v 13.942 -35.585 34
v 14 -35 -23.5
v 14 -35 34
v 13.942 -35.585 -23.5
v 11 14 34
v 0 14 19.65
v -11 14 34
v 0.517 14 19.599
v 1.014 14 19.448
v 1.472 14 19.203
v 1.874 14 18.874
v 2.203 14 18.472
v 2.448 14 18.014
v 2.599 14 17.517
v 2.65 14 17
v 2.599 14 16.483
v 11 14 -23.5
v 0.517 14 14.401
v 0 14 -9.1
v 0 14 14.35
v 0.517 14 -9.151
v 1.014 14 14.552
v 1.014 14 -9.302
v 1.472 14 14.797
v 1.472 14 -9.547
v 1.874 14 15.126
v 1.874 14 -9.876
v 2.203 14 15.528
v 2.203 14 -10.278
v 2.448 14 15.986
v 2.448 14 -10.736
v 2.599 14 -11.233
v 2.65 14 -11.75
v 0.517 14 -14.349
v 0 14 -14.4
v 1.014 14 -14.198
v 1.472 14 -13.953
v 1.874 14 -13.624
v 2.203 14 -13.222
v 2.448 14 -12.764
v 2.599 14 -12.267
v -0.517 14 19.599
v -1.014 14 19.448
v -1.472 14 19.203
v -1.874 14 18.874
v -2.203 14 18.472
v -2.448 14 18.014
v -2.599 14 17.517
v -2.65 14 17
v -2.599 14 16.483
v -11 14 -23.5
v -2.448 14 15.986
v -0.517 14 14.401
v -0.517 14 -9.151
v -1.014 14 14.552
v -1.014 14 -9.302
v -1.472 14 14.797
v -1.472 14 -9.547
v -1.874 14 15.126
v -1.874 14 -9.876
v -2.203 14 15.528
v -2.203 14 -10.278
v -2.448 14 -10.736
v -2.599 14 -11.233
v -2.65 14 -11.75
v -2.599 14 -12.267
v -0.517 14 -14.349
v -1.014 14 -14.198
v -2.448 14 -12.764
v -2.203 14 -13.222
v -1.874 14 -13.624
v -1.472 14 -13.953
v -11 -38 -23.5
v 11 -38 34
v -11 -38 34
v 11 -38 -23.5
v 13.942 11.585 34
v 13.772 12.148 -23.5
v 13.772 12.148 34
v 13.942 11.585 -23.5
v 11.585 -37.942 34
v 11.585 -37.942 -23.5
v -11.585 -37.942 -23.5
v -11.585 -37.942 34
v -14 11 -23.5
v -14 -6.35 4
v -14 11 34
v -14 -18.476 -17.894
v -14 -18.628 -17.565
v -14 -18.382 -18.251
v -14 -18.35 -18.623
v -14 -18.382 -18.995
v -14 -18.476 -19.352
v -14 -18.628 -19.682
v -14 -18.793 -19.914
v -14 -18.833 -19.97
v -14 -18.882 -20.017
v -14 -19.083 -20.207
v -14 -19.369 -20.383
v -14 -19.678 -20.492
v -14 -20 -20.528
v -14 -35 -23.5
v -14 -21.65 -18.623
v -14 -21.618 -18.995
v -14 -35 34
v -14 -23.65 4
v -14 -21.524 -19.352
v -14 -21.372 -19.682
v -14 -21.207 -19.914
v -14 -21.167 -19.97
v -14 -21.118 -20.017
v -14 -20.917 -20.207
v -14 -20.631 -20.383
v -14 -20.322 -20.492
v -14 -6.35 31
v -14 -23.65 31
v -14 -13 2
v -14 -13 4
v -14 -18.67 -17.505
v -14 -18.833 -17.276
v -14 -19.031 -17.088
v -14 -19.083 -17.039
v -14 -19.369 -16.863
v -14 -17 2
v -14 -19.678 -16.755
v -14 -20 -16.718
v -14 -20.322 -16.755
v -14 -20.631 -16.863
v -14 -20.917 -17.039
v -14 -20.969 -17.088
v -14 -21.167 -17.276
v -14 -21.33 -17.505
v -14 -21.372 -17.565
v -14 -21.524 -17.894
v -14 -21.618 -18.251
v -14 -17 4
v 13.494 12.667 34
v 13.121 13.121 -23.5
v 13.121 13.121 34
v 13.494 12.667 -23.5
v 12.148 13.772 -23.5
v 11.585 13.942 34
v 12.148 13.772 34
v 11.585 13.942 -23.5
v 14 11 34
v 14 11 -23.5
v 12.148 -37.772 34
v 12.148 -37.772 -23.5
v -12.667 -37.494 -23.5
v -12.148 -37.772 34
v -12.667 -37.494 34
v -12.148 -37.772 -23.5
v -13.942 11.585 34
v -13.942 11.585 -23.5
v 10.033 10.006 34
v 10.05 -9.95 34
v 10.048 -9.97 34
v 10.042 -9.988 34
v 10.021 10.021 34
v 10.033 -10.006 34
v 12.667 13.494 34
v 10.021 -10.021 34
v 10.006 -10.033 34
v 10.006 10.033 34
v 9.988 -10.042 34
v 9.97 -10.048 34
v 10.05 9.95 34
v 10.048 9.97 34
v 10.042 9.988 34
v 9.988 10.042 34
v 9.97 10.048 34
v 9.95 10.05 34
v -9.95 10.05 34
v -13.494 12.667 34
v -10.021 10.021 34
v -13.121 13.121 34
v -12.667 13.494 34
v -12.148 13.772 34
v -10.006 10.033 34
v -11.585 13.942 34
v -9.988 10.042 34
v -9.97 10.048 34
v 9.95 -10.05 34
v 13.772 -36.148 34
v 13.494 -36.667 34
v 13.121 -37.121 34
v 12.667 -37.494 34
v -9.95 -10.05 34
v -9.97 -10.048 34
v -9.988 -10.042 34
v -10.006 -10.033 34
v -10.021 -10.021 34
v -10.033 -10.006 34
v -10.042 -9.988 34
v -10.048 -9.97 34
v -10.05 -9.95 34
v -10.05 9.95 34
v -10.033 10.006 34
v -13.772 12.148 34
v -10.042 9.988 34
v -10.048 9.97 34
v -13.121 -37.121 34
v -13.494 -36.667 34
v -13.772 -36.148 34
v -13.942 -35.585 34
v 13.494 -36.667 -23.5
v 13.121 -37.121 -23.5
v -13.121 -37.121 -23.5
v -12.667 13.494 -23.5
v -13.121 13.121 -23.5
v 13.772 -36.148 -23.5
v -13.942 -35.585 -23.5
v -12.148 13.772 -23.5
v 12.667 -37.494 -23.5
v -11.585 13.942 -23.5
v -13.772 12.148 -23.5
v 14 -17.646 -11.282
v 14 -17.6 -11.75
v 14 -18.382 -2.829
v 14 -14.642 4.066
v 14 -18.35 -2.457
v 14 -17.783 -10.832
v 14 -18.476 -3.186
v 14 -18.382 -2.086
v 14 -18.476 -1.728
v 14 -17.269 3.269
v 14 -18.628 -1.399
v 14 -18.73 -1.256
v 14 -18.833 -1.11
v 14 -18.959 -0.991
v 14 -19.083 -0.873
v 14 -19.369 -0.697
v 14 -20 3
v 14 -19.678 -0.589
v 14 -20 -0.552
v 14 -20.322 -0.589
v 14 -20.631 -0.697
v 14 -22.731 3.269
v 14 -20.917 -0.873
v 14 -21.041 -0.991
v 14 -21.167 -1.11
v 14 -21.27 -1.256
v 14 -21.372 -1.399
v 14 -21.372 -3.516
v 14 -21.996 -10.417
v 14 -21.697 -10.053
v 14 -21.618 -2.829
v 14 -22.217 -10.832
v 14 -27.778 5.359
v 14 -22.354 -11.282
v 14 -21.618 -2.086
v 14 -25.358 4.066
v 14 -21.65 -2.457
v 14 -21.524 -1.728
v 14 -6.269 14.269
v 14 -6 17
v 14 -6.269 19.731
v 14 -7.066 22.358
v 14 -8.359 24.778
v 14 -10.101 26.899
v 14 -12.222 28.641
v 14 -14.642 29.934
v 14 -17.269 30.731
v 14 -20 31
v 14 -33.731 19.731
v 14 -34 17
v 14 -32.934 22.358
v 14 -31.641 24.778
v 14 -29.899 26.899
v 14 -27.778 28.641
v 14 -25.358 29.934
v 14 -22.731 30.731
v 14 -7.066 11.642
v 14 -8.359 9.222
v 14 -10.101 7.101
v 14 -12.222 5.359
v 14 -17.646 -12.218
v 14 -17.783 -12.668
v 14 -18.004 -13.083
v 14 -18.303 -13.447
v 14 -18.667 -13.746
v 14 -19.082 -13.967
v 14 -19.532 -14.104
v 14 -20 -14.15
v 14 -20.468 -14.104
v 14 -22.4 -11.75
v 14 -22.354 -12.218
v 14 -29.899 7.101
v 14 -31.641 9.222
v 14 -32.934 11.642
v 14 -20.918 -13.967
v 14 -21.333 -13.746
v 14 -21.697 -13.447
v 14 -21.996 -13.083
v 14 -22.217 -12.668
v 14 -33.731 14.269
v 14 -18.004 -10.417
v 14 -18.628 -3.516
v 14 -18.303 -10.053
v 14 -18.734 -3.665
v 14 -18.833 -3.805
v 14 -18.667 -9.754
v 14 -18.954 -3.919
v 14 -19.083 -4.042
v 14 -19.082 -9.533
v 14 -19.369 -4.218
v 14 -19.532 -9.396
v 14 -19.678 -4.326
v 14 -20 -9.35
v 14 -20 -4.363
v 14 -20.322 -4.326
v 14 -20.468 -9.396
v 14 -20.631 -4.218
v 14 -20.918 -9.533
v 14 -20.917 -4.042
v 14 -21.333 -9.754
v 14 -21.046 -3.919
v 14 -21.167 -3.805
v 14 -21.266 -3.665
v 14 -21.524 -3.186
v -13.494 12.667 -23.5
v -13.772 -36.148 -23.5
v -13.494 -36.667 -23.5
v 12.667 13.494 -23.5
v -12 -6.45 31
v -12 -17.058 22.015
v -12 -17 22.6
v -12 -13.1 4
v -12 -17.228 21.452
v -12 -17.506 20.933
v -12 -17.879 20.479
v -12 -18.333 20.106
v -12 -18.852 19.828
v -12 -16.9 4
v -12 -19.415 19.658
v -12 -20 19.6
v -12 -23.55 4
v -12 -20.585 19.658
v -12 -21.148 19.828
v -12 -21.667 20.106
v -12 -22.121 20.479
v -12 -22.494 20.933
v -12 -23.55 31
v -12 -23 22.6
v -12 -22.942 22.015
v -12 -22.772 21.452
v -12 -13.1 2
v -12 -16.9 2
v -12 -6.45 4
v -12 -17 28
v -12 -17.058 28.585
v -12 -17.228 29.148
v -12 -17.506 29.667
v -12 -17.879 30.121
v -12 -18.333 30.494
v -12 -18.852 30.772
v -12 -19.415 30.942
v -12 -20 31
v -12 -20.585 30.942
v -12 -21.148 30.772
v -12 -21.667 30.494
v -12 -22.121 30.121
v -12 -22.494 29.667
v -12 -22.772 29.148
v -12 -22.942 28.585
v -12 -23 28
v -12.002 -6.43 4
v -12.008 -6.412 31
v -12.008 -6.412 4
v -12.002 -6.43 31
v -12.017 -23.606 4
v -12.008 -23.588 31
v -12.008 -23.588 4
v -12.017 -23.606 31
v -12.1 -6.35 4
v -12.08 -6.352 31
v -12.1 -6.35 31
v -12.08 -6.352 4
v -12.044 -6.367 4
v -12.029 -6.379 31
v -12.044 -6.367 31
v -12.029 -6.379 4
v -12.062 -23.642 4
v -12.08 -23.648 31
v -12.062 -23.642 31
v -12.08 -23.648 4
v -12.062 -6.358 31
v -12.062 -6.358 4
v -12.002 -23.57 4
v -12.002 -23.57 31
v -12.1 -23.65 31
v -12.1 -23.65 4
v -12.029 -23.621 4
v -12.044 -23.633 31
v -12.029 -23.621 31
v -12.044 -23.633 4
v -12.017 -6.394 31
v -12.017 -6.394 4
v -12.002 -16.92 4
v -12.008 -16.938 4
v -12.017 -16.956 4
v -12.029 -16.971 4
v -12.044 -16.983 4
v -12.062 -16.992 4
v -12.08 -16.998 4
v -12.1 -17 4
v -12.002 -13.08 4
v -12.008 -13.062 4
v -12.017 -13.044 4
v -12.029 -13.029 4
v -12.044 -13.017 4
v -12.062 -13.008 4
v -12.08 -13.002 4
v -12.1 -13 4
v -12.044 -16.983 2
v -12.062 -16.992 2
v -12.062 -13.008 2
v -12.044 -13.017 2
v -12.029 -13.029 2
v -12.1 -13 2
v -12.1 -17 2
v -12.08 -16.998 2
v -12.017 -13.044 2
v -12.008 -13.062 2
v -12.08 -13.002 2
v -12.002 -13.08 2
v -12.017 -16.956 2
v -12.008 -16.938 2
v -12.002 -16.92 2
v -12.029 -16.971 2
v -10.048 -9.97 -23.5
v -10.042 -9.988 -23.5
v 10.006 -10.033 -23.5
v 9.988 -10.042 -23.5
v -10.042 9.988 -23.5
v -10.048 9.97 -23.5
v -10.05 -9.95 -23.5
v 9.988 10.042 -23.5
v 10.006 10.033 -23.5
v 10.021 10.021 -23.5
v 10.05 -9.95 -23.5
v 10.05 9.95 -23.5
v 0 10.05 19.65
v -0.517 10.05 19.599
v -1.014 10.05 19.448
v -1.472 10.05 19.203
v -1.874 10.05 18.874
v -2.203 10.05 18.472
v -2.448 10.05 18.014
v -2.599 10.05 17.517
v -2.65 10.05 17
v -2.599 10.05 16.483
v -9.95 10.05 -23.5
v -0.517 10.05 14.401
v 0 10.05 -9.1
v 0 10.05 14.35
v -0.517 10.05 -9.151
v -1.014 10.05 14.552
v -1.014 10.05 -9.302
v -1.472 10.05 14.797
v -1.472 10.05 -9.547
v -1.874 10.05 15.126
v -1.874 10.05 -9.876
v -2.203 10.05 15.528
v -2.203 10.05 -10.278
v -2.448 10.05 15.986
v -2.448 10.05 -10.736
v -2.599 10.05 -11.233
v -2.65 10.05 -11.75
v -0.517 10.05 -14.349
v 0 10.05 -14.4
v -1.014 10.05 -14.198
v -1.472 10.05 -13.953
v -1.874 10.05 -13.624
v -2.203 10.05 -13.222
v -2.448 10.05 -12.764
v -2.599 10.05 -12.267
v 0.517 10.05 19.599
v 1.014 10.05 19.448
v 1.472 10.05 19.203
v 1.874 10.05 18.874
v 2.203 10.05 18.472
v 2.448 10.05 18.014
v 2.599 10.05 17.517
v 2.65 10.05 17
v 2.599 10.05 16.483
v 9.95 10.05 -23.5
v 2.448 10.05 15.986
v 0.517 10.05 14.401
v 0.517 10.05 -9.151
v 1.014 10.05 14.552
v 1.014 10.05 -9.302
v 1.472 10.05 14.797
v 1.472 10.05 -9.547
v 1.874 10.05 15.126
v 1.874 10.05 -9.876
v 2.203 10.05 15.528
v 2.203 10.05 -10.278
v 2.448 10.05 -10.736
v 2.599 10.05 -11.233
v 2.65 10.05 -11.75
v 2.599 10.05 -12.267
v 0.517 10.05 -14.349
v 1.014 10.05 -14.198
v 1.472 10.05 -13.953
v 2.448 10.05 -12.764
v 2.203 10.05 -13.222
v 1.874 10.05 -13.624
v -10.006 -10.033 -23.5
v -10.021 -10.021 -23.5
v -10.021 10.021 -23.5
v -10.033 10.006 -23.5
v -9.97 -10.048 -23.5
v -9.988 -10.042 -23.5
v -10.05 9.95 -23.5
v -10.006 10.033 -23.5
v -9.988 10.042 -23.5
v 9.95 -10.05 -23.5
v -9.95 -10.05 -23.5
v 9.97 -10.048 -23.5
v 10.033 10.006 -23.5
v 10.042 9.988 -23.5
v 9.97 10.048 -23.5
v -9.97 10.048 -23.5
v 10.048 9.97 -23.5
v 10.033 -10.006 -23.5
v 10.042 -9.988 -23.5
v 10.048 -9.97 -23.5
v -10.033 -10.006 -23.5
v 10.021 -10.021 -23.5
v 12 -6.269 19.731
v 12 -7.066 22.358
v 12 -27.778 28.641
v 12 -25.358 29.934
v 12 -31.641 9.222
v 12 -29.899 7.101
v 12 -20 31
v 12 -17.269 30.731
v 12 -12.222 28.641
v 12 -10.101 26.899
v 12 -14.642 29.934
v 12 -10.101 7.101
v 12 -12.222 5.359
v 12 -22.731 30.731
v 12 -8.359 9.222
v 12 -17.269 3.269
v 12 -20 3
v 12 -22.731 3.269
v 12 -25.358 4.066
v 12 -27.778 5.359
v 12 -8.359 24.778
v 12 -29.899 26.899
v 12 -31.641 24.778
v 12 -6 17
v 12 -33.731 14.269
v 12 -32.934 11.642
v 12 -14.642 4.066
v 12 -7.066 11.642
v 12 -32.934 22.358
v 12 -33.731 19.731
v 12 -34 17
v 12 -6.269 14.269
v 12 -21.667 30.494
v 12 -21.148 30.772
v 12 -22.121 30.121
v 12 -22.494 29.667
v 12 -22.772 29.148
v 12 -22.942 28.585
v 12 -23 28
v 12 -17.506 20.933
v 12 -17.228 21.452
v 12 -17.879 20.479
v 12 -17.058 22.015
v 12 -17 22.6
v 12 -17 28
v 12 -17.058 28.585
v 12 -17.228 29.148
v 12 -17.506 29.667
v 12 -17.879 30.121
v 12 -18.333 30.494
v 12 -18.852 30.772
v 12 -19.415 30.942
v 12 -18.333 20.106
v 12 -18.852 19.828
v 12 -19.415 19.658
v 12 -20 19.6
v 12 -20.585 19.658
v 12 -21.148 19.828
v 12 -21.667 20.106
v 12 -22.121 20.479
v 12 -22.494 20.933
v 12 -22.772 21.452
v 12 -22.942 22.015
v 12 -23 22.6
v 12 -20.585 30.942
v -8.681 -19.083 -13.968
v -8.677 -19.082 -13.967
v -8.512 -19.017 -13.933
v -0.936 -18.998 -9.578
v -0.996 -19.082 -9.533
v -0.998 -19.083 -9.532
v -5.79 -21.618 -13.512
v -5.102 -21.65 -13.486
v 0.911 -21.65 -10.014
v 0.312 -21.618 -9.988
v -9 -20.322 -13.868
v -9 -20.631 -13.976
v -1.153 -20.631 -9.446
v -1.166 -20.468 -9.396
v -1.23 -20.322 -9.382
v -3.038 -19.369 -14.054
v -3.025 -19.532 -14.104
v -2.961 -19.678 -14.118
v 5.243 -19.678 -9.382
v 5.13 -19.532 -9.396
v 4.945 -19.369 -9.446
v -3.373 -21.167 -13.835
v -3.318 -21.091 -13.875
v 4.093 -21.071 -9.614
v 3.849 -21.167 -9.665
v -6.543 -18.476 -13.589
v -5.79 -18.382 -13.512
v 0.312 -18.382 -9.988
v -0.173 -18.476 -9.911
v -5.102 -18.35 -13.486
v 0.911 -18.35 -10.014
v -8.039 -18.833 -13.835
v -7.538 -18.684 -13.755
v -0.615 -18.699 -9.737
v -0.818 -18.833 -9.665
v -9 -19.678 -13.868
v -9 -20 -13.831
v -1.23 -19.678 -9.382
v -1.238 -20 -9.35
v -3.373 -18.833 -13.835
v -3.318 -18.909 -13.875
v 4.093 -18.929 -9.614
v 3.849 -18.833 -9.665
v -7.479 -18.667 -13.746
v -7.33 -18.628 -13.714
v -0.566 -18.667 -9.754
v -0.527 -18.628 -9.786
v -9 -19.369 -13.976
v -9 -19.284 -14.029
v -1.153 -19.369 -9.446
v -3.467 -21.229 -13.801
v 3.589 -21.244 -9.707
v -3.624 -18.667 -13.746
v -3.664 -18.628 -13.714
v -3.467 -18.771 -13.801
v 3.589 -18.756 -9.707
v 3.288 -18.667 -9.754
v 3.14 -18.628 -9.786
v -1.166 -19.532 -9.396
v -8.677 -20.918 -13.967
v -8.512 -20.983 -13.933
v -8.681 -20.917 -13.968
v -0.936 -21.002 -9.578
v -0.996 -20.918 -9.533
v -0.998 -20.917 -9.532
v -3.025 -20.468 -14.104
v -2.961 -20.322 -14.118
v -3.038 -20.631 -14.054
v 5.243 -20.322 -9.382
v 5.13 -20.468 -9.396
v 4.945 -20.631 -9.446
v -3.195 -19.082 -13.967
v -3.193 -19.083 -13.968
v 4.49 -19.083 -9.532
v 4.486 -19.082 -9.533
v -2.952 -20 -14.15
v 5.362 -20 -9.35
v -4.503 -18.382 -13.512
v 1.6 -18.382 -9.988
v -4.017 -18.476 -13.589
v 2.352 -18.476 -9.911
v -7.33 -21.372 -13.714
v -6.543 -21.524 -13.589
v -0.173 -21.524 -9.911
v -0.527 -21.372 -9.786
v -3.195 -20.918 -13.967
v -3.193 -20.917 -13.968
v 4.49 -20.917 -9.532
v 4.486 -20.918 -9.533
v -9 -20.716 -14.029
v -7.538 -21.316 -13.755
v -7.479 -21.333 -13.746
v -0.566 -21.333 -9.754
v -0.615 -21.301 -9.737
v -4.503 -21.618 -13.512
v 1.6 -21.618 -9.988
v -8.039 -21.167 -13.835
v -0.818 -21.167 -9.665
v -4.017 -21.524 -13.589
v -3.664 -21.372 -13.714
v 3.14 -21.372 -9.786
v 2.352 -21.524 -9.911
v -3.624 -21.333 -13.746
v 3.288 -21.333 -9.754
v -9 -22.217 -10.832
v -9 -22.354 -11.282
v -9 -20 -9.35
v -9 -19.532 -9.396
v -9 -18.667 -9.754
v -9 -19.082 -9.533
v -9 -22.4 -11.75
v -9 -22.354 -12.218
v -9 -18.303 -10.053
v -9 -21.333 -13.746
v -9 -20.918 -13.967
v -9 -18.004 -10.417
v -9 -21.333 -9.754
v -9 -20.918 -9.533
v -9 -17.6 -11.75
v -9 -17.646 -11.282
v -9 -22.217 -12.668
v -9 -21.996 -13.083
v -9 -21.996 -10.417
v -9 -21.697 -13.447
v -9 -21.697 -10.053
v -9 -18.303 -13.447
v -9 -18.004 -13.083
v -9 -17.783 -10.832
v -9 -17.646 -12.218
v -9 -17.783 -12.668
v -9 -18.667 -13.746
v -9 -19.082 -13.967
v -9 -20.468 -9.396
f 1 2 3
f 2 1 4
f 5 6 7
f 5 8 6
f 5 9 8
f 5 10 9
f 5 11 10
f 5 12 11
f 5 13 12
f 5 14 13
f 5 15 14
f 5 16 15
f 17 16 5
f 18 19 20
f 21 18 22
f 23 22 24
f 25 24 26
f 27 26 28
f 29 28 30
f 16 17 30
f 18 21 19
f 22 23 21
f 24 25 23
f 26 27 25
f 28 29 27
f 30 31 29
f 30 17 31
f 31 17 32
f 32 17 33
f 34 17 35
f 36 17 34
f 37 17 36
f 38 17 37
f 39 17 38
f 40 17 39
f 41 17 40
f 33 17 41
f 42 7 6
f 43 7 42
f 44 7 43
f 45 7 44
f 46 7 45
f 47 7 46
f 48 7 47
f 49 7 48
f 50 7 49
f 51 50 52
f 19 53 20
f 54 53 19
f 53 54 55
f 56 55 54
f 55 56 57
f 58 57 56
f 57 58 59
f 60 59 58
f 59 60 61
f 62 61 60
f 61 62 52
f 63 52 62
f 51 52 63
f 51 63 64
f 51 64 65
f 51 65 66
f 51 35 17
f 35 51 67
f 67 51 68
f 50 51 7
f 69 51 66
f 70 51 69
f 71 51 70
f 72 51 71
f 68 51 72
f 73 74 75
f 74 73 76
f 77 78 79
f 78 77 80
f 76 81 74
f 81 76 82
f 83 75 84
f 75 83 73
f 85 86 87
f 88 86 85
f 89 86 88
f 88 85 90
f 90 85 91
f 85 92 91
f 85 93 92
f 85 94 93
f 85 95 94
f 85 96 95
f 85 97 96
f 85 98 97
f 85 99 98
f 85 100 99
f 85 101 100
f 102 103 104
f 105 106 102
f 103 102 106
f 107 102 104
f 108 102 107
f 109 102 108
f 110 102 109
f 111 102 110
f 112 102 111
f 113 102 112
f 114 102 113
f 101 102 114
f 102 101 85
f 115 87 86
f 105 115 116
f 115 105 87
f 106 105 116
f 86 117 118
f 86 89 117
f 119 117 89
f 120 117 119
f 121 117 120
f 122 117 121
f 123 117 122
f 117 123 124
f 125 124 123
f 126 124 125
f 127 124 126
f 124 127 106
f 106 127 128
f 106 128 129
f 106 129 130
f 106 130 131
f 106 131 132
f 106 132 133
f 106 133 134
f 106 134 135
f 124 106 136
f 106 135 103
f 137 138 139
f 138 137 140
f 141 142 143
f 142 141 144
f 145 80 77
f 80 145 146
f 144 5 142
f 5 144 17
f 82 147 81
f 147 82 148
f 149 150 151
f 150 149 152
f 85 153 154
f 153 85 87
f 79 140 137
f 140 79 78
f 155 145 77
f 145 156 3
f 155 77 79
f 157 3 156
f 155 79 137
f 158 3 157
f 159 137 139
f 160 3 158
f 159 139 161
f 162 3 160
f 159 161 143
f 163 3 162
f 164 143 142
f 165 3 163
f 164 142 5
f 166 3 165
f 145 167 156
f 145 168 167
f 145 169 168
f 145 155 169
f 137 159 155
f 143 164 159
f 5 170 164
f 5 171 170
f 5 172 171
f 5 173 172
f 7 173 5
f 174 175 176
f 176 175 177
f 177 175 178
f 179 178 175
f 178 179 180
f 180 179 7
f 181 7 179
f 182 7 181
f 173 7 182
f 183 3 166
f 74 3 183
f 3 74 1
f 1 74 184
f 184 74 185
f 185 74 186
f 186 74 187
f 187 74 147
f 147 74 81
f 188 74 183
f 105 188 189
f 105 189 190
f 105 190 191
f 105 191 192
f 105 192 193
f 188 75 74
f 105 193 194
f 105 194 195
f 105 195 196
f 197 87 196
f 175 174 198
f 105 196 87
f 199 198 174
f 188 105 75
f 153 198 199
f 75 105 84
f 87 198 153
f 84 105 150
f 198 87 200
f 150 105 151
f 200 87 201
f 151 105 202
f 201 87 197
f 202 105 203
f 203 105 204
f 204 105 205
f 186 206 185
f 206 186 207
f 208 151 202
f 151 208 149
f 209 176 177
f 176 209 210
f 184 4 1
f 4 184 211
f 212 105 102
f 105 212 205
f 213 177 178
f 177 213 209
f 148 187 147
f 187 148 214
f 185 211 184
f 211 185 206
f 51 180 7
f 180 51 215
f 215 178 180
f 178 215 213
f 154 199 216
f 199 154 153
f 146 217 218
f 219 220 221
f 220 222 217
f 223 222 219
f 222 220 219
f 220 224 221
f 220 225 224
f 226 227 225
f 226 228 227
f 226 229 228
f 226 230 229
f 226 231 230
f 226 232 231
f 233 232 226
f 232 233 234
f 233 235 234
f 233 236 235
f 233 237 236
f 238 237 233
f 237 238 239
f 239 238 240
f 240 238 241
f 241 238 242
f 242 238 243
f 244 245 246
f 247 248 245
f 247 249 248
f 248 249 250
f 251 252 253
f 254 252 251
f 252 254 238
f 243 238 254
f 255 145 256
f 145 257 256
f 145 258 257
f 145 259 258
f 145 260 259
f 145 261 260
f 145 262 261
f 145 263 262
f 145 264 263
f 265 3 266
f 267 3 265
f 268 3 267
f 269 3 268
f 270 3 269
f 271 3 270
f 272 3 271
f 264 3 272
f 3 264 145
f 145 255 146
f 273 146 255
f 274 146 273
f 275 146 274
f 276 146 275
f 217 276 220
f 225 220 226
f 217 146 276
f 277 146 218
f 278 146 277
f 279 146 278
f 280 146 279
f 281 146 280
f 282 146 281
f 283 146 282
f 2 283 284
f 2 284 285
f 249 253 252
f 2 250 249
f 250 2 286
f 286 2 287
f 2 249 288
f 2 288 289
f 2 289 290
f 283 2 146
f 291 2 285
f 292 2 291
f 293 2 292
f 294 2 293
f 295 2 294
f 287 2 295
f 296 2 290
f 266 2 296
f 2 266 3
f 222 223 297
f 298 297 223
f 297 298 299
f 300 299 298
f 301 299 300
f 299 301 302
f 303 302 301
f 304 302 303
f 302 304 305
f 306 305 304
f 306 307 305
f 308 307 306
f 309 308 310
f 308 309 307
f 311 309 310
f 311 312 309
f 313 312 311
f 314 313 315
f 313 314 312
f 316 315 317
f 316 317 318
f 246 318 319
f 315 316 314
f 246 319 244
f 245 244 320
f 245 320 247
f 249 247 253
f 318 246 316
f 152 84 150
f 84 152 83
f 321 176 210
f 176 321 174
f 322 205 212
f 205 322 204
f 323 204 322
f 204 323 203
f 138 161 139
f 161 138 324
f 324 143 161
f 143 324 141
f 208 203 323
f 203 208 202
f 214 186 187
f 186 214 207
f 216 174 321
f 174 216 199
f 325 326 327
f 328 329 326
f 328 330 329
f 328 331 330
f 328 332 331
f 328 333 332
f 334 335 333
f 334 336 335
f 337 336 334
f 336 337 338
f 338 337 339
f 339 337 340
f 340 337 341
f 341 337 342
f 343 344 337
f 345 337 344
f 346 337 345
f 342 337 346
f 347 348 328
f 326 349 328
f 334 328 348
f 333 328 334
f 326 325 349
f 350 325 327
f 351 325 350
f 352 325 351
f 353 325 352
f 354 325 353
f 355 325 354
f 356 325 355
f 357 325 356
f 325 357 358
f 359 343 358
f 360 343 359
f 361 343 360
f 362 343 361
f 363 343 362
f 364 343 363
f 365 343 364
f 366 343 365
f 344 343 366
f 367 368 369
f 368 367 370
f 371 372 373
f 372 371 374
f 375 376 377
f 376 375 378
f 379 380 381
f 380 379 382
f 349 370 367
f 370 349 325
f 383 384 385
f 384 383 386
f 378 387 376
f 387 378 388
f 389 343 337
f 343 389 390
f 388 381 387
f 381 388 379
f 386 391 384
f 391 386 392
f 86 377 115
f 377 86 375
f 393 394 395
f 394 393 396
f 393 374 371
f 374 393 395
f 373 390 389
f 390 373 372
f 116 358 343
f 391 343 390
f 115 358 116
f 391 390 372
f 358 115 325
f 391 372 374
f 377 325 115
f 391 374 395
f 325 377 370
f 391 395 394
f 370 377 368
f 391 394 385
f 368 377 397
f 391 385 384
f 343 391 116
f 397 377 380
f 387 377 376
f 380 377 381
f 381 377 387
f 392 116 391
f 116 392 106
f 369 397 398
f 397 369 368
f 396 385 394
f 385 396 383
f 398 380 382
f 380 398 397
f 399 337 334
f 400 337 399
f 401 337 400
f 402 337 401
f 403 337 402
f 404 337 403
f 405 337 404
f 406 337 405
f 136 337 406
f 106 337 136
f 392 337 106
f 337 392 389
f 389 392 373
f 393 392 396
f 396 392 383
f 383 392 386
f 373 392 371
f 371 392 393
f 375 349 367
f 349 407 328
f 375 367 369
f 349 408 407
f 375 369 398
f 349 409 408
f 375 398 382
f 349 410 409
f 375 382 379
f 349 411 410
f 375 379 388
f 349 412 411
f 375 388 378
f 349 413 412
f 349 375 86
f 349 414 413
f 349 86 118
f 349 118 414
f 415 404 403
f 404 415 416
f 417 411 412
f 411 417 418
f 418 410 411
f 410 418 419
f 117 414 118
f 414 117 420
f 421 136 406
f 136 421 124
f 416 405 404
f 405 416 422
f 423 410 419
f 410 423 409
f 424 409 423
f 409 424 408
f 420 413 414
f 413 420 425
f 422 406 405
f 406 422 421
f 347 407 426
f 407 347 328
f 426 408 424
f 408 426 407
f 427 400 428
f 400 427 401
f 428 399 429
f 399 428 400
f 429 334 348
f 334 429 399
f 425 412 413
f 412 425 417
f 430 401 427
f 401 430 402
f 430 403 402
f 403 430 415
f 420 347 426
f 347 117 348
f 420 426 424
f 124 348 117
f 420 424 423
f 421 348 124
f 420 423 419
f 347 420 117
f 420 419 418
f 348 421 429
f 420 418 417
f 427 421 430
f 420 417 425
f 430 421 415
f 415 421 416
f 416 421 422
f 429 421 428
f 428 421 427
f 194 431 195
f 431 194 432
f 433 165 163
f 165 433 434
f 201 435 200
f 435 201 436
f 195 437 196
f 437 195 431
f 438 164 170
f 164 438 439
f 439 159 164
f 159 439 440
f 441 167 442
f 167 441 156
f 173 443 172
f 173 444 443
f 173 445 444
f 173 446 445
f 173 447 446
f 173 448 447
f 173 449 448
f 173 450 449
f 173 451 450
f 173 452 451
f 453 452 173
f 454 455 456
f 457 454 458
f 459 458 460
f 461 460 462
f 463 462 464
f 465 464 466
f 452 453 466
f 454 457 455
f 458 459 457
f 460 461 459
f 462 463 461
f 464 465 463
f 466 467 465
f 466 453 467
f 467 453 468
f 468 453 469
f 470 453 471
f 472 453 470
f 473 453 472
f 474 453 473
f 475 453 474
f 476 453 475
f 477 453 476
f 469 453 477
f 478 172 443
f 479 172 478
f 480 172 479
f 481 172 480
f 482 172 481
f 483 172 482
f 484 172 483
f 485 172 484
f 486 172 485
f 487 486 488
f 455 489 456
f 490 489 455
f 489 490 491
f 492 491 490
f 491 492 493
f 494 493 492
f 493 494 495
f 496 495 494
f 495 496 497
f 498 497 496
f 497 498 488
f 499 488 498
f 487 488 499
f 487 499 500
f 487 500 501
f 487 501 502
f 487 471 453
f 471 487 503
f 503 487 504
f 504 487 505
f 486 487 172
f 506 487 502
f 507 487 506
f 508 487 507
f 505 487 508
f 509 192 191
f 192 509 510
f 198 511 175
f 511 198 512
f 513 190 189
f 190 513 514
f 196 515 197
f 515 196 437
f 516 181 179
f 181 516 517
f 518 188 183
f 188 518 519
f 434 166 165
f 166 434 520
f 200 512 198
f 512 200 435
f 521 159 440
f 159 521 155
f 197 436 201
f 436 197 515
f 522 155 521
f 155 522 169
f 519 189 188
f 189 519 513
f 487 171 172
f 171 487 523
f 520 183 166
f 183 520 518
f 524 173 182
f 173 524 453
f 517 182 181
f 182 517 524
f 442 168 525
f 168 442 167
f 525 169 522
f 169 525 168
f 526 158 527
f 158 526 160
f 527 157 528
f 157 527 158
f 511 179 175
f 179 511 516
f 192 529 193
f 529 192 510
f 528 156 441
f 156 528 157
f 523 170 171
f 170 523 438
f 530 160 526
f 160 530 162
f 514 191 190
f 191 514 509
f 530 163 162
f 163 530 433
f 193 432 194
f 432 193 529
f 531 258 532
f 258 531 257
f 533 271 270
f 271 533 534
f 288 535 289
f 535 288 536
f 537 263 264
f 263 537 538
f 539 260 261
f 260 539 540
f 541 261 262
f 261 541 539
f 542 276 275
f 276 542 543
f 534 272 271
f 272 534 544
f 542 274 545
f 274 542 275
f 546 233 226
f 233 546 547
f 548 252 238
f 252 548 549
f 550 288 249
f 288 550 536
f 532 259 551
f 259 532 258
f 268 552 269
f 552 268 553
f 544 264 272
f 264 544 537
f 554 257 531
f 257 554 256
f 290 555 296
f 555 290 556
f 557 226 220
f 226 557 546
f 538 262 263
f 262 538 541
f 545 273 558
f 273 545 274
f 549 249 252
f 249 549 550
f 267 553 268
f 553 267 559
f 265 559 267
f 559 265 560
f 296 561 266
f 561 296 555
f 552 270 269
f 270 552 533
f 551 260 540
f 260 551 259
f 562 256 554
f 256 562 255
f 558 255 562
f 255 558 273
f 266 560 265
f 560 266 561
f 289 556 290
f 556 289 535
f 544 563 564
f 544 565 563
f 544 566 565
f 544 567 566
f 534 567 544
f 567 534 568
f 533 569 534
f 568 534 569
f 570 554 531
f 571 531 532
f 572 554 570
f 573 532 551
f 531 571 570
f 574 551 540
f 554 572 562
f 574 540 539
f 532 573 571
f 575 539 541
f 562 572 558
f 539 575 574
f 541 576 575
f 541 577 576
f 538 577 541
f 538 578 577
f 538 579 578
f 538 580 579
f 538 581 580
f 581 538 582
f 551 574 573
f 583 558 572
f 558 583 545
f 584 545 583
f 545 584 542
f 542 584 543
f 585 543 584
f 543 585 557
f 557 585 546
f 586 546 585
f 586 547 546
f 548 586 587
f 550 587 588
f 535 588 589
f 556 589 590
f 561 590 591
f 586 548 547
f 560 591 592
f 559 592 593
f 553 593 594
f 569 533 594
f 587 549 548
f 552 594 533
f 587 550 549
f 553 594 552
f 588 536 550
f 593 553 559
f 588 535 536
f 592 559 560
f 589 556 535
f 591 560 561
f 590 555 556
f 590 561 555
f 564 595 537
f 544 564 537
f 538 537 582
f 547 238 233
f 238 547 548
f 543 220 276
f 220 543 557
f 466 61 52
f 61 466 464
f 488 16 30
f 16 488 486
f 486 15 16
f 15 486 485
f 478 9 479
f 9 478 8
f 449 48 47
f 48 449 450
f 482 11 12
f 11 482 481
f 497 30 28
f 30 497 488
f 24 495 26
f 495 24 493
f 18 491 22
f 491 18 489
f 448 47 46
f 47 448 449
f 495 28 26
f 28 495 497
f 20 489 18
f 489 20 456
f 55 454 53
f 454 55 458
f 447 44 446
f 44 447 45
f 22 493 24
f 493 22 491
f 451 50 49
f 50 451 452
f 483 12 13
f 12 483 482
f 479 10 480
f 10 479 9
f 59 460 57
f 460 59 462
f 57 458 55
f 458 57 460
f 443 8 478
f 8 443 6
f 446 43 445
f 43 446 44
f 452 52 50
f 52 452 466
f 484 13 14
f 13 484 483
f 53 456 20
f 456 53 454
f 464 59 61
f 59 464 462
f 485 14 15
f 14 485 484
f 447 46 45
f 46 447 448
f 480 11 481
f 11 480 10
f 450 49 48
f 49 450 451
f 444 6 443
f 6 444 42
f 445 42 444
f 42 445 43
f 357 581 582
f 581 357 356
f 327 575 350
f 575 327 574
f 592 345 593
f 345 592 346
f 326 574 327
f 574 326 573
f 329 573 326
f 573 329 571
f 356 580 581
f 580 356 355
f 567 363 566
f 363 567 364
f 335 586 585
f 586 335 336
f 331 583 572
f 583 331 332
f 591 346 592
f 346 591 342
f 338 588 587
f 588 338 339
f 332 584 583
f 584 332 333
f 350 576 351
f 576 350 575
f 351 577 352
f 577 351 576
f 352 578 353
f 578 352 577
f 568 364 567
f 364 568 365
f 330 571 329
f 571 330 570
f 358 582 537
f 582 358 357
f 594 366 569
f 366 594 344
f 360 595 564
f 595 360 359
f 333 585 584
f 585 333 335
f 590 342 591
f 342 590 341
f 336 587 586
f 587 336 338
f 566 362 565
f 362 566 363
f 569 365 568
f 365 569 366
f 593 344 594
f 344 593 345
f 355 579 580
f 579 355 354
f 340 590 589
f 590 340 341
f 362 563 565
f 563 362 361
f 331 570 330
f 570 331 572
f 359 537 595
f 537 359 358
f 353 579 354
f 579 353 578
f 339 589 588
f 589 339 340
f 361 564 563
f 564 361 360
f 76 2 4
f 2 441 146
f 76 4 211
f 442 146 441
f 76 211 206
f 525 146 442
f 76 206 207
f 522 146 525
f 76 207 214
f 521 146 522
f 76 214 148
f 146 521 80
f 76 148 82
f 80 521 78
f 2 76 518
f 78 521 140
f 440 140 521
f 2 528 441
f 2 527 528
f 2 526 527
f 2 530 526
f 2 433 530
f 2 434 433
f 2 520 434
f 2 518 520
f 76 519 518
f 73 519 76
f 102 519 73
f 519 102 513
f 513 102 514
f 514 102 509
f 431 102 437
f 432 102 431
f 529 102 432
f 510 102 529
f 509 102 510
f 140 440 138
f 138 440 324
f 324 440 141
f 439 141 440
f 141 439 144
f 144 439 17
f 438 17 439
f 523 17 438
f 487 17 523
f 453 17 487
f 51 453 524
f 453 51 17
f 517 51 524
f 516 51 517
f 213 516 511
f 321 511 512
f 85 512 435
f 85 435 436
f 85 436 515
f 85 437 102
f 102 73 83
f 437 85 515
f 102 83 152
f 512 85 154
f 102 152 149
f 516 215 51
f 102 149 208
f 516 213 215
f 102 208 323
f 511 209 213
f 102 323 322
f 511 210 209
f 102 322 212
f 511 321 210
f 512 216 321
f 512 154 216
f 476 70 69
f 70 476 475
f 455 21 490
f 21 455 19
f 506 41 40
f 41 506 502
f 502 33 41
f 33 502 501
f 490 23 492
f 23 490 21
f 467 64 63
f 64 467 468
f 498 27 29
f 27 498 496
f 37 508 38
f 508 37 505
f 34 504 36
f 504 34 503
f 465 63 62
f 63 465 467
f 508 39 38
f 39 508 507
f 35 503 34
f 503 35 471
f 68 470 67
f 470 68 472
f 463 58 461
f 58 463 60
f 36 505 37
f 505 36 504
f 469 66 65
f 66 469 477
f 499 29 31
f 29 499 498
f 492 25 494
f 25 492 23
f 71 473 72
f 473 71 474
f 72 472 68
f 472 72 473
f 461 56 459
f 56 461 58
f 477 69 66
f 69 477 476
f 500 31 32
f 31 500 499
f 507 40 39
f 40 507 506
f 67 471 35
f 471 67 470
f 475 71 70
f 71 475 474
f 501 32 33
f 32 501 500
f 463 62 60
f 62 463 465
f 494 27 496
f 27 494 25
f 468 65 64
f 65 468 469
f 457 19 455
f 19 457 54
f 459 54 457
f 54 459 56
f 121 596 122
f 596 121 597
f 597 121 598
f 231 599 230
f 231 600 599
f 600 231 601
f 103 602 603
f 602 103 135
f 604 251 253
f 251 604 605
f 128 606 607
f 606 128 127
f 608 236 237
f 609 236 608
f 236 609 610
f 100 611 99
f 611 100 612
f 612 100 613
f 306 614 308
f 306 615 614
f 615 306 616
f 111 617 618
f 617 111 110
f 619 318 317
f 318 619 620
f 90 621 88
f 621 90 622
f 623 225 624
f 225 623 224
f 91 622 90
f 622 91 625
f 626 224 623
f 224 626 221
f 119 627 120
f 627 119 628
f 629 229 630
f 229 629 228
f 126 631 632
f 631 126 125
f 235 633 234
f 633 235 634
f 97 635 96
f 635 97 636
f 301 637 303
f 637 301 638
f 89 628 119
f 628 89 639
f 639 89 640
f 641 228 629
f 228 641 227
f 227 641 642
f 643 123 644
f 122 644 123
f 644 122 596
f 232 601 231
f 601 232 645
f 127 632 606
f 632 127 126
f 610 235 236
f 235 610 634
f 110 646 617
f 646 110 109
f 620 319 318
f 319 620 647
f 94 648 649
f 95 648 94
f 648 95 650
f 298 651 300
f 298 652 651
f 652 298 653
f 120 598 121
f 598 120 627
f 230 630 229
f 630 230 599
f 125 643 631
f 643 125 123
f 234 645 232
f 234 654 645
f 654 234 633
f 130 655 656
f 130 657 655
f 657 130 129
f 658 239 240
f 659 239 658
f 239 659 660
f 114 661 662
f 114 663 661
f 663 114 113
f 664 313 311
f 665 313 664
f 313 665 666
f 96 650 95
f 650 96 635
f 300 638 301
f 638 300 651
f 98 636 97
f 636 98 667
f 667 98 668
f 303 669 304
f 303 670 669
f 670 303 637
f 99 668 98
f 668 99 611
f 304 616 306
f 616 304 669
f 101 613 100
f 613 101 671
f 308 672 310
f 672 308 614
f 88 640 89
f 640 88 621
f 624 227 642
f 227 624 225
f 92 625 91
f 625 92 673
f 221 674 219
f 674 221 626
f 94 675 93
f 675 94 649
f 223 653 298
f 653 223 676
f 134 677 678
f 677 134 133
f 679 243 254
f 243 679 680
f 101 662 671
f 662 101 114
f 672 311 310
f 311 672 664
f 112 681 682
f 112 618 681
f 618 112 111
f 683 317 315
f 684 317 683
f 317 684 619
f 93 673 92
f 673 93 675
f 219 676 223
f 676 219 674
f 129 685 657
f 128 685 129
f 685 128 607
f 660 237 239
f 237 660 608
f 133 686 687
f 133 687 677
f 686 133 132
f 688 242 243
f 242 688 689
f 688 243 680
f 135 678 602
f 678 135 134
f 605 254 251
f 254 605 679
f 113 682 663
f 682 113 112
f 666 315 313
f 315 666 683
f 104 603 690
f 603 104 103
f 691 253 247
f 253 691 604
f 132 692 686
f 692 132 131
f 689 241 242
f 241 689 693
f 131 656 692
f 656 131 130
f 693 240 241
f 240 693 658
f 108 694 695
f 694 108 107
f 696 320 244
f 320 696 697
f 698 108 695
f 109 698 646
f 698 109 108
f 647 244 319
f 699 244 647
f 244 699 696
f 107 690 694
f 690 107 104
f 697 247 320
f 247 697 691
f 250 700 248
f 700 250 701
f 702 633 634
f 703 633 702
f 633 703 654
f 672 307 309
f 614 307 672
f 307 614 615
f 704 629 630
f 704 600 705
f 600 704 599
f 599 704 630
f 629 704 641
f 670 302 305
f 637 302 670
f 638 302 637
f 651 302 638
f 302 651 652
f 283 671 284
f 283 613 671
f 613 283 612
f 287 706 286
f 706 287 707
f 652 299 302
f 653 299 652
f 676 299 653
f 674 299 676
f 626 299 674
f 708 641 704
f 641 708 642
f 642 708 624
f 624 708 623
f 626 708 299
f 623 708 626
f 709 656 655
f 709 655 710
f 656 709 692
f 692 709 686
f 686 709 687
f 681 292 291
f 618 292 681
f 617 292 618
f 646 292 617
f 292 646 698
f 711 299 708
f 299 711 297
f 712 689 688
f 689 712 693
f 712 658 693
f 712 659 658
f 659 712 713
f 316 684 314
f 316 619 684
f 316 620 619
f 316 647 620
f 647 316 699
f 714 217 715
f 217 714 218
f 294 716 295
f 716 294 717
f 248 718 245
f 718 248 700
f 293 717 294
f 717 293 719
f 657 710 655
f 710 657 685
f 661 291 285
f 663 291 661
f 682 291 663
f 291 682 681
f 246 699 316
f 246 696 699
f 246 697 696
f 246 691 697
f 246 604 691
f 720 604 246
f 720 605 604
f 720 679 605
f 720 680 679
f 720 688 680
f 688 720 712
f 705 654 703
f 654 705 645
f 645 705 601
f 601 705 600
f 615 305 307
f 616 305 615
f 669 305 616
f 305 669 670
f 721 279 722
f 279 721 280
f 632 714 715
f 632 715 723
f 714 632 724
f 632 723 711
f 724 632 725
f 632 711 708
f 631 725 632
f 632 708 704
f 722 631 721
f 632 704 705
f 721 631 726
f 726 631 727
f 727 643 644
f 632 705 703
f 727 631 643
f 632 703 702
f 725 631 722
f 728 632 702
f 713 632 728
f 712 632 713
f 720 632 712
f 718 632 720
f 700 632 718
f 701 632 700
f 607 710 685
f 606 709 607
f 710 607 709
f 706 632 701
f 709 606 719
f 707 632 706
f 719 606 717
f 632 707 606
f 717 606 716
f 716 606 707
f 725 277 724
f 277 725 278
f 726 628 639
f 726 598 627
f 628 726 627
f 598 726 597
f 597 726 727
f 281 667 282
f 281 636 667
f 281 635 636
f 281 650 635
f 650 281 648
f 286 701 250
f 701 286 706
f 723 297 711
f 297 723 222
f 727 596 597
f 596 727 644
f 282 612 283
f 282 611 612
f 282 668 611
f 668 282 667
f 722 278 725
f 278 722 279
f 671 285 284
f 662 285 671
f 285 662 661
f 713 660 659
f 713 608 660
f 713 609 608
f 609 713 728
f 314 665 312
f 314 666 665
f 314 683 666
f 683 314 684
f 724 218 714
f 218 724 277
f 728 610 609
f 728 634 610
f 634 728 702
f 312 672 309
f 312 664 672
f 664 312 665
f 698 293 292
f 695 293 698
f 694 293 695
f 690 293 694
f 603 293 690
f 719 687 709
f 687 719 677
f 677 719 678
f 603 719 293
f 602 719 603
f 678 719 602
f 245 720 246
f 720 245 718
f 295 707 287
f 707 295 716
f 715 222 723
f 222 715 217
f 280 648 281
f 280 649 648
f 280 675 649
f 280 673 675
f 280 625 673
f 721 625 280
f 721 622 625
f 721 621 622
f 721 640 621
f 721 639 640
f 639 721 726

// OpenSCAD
// file: parameter.scad
//-------Parameter GHarp----------------------------------------------------

strScale=650;
strDia=3;
strPosX=20;
strPosY=-20;
slotXY=20;
nStr=3;

nema17_height=40;
nema17_width=42;
nema17_shftDia=5;
nema17_shftLen=28;
nema17_holeDist=31;
Nema17_gearDia=23;

tuner_bDi=7.8;
tuner_bDo=22.2;
tuner_bZ=10;
tuner_rThick=5;
//tuner_tDia=strPosX*2; (big)
tuner_tDia=strPosX*2-10;
tuner_leverZ=10;
tuner_zPos=225;
tuner_strDia=strDia[0];
tuner_leverY=35;

//----------Kickup----------------------------------------------------

kickup_baseX=17;
kickup_baseY=13;
kickup_zAdjDia=3.3;
kickup_zAdjL=10;
kickup_zAdjDist=10.5;
kickup_zAdjOff=4;
//------------------------------------------------------------------------

slide_cpDst=1.5;
slide_rackPosX=(55-12.5);

m3Dia=3.3;
m3NutD=6.6;
m4Dia=4.3;
m4NutD=8.3;
m4NutZ=5;
m5Dia=5.3;
m5HeadD=9.6;

edgeR=3;

gearXPos=57;
gearYPos=0;
gearZPos=360;

rackScrD=20;
rack_X=13;
rack_Y=15.5;
rack_extOffX=0;

bearGearD=25;
mntGrD=20.5; //mount gear distance

mnt_pcbA_X=157;
mnt_pcbA_Y=101;

//---------End Parameter GHarp-----------------------------------------------


////-------Parameter Bass----------------------------------------------------

//strScale=650;
//strDia=4;
//strPosX=20;
//strPosY=-20;
//slotXY=20;
//
//nema17_height=40;
//nema17_width=42;
//nema17_shftDia=5;
//nema17_shftLen=28;
//nema17_holeDist=31;
//Nema17_gearDia=23;
//
//tuner_bDi=7.8;
//tuner_bDo=22.2;
//tuner_bZ=10;
//tuner_rThick=5;
////tuner_tDia=strPosX*2; (big)
//tuner_tDia=strPosX*2-10;
//tuner_leverZ=10;
//tuner_zPos=225;
//tuner_strDia=strDia[0];
//tuner_leverY=35;
//
////----------Kickup----------------------------------------------------
//
//
//kickup_baseX=22;
//kickup_baseY=15;
//kickup_zAdjDia=3.3;
//kickup_zAdjL=10;
//kickup_zAdjDist=13;
//kickup_zAdjOff=4;
//
//
//slide_cpDst=1.5;
//slide_rackPosX=(55-12.5);
//
//m3NutD=6.6;
//m4Dia=4.3;
//m4NutD=8.3;
//m5Dia=5.3;
//
//edgeR=3;
//
//gearXPos=57;
//gearYPos=0;
//gearZPos=360;
//
//rackScrD=20;
//rack_X=13;
//rack_Y=15.5;
//rack_extOffX=0;
//
//bearGearD=25;
//mntGrD=20.5; //mount gear distance
////
//////---------End Bass-----------------------------------------------
// file: libs/rcube.scad
module rcube(size,radius){
linear_extrude(height=size[2])
if(radius>0){
hull()
{
    // place 4 circles in the corners, with the given radius
    translate([(-size[0]/2)+(radius), (-size[1]/2)+(radius), 0])
    circle(r=radius);

    translate([(size[0]/2)-(radius), (-size[1]/2)+(radius), 0])
    circle(r=radius);

    translate([(-size[0]/2)+(radius), (size[1]/2)-(radius), 0])
    circle(r=radius);

    translate([(size[0]/2)-(radius), (size[1]/2)-(radius), 0])
    circle(r=radius);
}
}
if(radius==0){
translate([0,0,size[2]/2])cube(size,center=true);
}
}
// main file
include <libs/rcube.scad>;
include <parameter.scad>;

bridge();

module bridge(){
edgeR=3;
wthick=4;
pzDia=28;
pzSink=2;
pzThick=0.6;

pcbX=4;
pcbY=17.3;
pcbZ=27;

bH=slotXY*1.175;    
xy=slotXY+wthick*2;
h=pzDia+wthick+2;
t=0.1;
$fn=32;

piezo();
translate([0,0,-bH])bridge();
//translate([slotXY/2+wthick+pzThick-pzSink,-slotXY,h/2])rotate([0,90,0])Pz2Str();

module piezo(){
difference(){
hull(){
rcube([xy,xy,h],edgeR);
translate([0,strPosY,0])rcube([xy,pzDia+wthick*2,h],edgeR);
}
translate([-xy/2,strPosY+5,h/2-pcbZ+pzDia/2])rcube([pcbX,pcbY,pcbZ],0.1);
translate([-xy/2,strPosY+5,h/2-pcbZ+pzDia/2-2])rcube([pcbX,4,pcbZ],0.1);
translate([0,0,-5])rcube([slotXY+t,slotXY+t,h*2],0.1);
translate([xy/2,strPosY,h/2])rotate([0,-90,0])cylinder(d=pzDia,h=pzSink*2,center=true);
translate([0,0,h/2])rotate([-90,0,0])cylinder(d=m5Dia,h=xy);
hull(){
d=6;
translate([0,strPosY,h/2+pzDia/5])rotate([0,90,0])cylinder(d=d,h=xy*2,center=true);
translate([0,strPosY,h/2+pzDia/2-d/2])rotate([0,90,0])cylinder(d=d,h=xy*2,center=true);
}
}
}

module Pz2Str(){
    bridgeZ=4.5;
    pzDia=pzDia-1;
    bridgeD=m3NutD*1.5;
    baseZ=3.5;
    m4Dia=4.5;
    scrwD=3.3;
    nutD=m3NutD;
    scrwDst=12;//pzDia-bridgeD;
    cDia=4;
    difference([0,0,0]){
    union(){
    cylinder(d=pzDia,h=baseZ);
    translate([0,0,8])difference(){
    hull(){
        translate([0,scrwDst/2,0])cylinder(d=bridgeD,h=bridgeZ);
        translate([0,-scrwDst/2,0])cylinder(d=bridgeD,h=bridgeZ);
    }
    translate([0,scrwDst/2,-1.5])cylinder(d=nutD,h=bridgeZ,$fn=6);
    translate([0,-scrwDst/2,-1.5])cylinder(d=nutD,h=bridgeZ,$fn=6);
    translate([0,0,0])rotate([90,0,0])scale([1,0.6,1]){
    rotate_extrude(convexity = 10)
    translate([(bridgeD)/2+cDia/2, 0, 0])
    union(){
    circle(r = cDia/2, $fn = 100);
    translate([0,-cDia/2,0])square([cDia*6,cDia]);
    }
    }
}

}
    

    translate([0,scrwDst/2,1])cylinder(d=scrwD,h=20);
    translate([0,-scrwDst/2,1])cylinder(d=scrwD,h=20);
}
}
module bridge(){
    
xy=slotXY+wthick*2;
h=bH;

difference(){
hull(){
rcube([xy,xy,h],edgeR);
translate([0,strPosY,0])rcube([xy,pzDia+wthick*2,h],edgeR);
translate([0,strPosY,0])rcube([xy,pzDia+wthick*2,h],edgeR);
}
translate([0,0,h/2])rotate([-90,0,0])cylinder(d=m5Dia,h=xy);
translate([0,0,-5])rcube([slotXY+t,slotXY+t,h*2],0.1);
translate([xy/2+1,strPosY,h*0.92])rotate([0,-120,0])cylinder(d=strDia+0.3,h=xy*4,center=true);
translate([xy/2+5,strPosY,h*0.5])rotate([0,-90,0])cylinder(d=4.8,h=xy);
}

}

module piezoramp(){
piezodia=27.5;
plate_height=8;
screwdia=5.8;
screwsink=6;
ramp_balldia=16;
$fn=32;
piezosupport=0;
piezosink=pzSink;
screwsink=5;
width=10;
spread=10;

scale([1,1,1.1]){
translate([0,spread/2,-piezosink]){
difference(){
sphere(d=ramp_balldia);
translate([0,0,-ramp_balldia/2]){
cube([ramp_balldia*2,ramp_balldia*2,ramp_balldia],center=true);}
translate([ramp_balldia/2+width/2,0,0]){
cube([ramp_balldia,ramp_balldia,ramp_balldia],center=true);}
translate([-ramp_balldia/2-width/2,0,0]){
cube([ramp_balldia,ramp_balldia,ramp_balldia],center=true);}
}}
translate([0,-spread/2,-piezosink]){
difference(){
sphere(d=ramp_balldia);
translate([0,0,-ramp_balldia/2]){
cube([ramp_balldia*2,ramp_balldia*2,ramp_balldia],center=true);}
translate([ramp_balldia/2+width/2,0,0]){
cube([ramp_balldia,ramp_balldia,ramp_balldia],center=true);}
translate([-ramp_balldia/2-width/2,0,0]){
cube([ramp_balldia,ramp_balldia,ramp_balldia],center=true);}
}}
}
}

}
